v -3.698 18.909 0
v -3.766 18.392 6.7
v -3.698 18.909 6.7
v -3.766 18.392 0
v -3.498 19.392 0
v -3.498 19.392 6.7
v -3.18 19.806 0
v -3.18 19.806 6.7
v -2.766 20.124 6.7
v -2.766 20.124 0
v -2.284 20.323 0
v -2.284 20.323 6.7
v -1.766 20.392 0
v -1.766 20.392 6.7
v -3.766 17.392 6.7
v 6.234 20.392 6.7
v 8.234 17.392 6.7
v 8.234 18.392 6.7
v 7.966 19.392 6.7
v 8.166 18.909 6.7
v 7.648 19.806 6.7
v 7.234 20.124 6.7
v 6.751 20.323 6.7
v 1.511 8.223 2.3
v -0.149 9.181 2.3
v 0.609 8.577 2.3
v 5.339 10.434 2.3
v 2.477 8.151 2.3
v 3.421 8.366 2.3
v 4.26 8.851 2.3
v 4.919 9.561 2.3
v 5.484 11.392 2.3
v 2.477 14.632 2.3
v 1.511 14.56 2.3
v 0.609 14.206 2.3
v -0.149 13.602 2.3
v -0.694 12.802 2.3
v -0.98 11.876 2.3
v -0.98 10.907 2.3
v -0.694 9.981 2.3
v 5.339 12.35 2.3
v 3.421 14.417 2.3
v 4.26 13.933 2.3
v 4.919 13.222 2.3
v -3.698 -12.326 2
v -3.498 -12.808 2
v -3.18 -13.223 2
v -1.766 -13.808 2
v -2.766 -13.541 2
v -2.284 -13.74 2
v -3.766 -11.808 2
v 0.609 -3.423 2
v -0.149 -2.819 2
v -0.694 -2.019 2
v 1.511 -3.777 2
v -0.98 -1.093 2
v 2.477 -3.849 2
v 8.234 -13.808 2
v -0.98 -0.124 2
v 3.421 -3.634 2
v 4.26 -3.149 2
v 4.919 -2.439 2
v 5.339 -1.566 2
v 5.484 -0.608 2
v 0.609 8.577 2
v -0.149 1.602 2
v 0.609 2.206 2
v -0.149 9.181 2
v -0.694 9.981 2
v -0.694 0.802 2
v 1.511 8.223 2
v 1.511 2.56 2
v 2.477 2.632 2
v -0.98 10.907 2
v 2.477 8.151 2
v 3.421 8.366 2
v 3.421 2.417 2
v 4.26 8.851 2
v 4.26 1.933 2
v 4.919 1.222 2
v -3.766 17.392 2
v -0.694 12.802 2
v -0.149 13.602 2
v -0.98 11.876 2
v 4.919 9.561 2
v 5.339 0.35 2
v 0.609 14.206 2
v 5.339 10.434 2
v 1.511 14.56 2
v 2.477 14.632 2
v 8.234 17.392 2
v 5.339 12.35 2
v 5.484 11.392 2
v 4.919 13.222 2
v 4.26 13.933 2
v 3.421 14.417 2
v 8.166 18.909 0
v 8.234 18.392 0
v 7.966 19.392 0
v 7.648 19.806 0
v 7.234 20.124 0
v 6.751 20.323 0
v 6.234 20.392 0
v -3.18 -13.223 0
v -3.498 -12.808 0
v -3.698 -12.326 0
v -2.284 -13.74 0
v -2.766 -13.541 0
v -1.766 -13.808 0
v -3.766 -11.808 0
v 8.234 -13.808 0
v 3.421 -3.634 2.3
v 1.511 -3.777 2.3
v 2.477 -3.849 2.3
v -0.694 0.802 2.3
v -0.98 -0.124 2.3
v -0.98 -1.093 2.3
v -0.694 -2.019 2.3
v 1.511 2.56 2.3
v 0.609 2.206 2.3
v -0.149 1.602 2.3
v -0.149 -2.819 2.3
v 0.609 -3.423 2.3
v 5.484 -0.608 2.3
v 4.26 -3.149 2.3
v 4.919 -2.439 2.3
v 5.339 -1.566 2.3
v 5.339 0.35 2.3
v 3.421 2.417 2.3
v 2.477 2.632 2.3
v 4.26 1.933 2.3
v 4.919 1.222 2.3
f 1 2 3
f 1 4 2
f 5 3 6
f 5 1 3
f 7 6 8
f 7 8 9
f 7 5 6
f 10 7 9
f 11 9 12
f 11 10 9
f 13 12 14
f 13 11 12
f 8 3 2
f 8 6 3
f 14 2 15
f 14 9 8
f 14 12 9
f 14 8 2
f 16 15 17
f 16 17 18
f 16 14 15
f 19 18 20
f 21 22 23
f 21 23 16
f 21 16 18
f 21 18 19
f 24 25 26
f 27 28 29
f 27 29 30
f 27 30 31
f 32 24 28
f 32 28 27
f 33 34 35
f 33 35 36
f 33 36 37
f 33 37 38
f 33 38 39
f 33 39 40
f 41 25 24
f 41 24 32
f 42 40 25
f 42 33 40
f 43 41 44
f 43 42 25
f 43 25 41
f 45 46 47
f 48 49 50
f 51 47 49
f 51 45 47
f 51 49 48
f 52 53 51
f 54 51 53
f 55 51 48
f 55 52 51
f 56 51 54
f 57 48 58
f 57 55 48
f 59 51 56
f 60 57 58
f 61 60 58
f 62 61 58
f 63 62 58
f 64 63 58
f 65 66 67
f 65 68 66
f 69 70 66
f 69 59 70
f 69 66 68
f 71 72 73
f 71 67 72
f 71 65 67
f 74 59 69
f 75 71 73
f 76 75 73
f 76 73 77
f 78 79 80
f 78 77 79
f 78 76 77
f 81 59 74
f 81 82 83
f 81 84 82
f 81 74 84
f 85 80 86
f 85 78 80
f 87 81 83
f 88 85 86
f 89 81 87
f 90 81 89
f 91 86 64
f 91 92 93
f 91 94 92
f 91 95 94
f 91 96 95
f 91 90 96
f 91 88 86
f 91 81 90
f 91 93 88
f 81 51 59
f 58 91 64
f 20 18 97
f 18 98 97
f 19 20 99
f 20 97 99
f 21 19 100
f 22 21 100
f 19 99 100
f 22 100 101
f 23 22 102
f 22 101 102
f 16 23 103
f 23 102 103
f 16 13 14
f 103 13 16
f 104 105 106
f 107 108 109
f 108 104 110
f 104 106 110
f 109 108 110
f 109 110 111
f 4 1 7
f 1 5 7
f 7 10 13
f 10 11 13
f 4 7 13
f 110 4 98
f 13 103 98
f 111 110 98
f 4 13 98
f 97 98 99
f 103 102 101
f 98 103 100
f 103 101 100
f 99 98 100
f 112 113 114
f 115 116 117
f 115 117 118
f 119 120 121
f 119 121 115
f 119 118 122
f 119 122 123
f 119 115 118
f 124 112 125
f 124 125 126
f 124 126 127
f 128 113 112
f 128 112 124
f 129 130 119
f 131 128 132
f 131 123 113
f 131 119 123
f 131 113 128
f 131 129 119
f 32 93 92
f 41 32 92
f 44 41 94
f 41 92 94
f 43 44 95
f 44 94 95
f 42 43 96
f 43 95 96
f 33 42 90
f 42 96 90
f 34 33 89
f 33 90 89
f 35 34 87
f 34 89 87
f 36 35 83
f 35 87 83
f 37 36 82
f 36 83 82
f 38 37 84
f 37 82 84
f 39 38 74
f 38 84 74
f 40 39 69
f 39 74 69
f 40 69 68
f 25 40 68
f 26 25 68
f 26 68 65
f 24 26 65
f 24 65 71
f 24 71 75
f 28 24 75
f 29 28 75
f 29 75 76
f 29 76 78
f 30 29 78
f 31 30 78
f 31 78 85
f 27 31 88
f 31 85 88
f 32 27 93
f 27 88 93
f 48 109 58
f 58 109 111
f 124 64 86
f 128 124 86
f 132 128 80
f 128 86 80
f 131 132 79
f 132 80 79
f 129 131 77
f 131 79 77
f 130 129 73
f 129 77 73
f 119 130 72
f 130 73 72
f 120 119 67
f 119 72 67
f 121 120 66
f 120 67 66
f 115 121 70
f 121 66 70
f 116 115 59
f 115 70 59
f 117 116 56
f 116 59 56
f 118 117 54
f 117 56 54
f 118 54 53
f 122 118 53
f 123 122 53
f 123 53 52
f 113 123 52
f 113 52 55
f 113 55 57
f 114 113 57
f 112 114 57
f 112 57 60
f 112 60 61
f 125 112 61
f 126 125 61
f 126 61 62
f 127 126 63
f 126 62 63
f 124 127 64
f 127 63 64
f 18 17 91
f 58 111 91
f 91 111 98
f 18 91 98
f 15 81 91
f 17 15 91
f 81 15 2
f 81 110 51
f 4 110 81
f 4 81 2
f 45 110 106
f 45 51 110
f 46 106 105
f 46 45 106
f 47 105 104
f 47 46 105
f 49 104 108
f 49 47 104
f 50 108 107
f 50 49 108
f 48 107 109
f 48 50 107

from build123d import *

# Parameters (mm, degrees)
ESQUISSE1_W        = 12
ESQUISSE1_H        = 34.2
BOSS_EXTRU_1_DEPTH = 2
ESQUISSE2_R        = 3.25
BOSS_EXTRU_2_DEPTH = 0.3
ESQUISSE3_W        = 12
ESQUISSE3_H        = 3
BOSS_EXTRU_3_DEPTH = 4.7
CONG_1_R           = 2


with BuildPart() as part:
    # Esquisse1 → Boss.-Extru.1 (new body)
    with BuildSketch(Plane.XY):
        with Locations((2.233800948, 3.291549296)):
            Rectangle(ESQUISSE1_W, ESQUISSE1_H)
    extrude(amount=BOSS_EXTRU_1_DEPTH)

    # Esquisse2 → Boss.-Extru.2 (add)
    with BuildSketch(Plane.XY.offset(2)):
        with Locations((2.233800948, 11.391549296)):
            Circle(ESQUISSE2_R)
        with Locations((2.233800948, -0.608450704)):
            Circle(ESQUISSE2_R)
    extrude(amount=BOSS_EXTRU_2_DEPTH)

    # Esquisse3 → Boss.-Extru.3 (add)
    with BuildSketch(Plane.XY.offset(2)):
        with Locations((2.233800948, 18.891549296)):
            Rectangle(ESQUISSE3_W, ESQUISSE3_H)
    extrude(amount=BOSS_EXTRU_3_DEPTH)

    # Congé1
    cong_1_edges = [part.edges().sort_by_distance(p)[0] for p in [
        (-3.766199052, 20.391549296, 3.35),
        (8.233800948, 20.391549296, 3.35),
        (-3.766199052, -13.808450704, 1),
    ]]
    fillet(cong_1_edges, radius=CONG_1_R)


solid = part.part
